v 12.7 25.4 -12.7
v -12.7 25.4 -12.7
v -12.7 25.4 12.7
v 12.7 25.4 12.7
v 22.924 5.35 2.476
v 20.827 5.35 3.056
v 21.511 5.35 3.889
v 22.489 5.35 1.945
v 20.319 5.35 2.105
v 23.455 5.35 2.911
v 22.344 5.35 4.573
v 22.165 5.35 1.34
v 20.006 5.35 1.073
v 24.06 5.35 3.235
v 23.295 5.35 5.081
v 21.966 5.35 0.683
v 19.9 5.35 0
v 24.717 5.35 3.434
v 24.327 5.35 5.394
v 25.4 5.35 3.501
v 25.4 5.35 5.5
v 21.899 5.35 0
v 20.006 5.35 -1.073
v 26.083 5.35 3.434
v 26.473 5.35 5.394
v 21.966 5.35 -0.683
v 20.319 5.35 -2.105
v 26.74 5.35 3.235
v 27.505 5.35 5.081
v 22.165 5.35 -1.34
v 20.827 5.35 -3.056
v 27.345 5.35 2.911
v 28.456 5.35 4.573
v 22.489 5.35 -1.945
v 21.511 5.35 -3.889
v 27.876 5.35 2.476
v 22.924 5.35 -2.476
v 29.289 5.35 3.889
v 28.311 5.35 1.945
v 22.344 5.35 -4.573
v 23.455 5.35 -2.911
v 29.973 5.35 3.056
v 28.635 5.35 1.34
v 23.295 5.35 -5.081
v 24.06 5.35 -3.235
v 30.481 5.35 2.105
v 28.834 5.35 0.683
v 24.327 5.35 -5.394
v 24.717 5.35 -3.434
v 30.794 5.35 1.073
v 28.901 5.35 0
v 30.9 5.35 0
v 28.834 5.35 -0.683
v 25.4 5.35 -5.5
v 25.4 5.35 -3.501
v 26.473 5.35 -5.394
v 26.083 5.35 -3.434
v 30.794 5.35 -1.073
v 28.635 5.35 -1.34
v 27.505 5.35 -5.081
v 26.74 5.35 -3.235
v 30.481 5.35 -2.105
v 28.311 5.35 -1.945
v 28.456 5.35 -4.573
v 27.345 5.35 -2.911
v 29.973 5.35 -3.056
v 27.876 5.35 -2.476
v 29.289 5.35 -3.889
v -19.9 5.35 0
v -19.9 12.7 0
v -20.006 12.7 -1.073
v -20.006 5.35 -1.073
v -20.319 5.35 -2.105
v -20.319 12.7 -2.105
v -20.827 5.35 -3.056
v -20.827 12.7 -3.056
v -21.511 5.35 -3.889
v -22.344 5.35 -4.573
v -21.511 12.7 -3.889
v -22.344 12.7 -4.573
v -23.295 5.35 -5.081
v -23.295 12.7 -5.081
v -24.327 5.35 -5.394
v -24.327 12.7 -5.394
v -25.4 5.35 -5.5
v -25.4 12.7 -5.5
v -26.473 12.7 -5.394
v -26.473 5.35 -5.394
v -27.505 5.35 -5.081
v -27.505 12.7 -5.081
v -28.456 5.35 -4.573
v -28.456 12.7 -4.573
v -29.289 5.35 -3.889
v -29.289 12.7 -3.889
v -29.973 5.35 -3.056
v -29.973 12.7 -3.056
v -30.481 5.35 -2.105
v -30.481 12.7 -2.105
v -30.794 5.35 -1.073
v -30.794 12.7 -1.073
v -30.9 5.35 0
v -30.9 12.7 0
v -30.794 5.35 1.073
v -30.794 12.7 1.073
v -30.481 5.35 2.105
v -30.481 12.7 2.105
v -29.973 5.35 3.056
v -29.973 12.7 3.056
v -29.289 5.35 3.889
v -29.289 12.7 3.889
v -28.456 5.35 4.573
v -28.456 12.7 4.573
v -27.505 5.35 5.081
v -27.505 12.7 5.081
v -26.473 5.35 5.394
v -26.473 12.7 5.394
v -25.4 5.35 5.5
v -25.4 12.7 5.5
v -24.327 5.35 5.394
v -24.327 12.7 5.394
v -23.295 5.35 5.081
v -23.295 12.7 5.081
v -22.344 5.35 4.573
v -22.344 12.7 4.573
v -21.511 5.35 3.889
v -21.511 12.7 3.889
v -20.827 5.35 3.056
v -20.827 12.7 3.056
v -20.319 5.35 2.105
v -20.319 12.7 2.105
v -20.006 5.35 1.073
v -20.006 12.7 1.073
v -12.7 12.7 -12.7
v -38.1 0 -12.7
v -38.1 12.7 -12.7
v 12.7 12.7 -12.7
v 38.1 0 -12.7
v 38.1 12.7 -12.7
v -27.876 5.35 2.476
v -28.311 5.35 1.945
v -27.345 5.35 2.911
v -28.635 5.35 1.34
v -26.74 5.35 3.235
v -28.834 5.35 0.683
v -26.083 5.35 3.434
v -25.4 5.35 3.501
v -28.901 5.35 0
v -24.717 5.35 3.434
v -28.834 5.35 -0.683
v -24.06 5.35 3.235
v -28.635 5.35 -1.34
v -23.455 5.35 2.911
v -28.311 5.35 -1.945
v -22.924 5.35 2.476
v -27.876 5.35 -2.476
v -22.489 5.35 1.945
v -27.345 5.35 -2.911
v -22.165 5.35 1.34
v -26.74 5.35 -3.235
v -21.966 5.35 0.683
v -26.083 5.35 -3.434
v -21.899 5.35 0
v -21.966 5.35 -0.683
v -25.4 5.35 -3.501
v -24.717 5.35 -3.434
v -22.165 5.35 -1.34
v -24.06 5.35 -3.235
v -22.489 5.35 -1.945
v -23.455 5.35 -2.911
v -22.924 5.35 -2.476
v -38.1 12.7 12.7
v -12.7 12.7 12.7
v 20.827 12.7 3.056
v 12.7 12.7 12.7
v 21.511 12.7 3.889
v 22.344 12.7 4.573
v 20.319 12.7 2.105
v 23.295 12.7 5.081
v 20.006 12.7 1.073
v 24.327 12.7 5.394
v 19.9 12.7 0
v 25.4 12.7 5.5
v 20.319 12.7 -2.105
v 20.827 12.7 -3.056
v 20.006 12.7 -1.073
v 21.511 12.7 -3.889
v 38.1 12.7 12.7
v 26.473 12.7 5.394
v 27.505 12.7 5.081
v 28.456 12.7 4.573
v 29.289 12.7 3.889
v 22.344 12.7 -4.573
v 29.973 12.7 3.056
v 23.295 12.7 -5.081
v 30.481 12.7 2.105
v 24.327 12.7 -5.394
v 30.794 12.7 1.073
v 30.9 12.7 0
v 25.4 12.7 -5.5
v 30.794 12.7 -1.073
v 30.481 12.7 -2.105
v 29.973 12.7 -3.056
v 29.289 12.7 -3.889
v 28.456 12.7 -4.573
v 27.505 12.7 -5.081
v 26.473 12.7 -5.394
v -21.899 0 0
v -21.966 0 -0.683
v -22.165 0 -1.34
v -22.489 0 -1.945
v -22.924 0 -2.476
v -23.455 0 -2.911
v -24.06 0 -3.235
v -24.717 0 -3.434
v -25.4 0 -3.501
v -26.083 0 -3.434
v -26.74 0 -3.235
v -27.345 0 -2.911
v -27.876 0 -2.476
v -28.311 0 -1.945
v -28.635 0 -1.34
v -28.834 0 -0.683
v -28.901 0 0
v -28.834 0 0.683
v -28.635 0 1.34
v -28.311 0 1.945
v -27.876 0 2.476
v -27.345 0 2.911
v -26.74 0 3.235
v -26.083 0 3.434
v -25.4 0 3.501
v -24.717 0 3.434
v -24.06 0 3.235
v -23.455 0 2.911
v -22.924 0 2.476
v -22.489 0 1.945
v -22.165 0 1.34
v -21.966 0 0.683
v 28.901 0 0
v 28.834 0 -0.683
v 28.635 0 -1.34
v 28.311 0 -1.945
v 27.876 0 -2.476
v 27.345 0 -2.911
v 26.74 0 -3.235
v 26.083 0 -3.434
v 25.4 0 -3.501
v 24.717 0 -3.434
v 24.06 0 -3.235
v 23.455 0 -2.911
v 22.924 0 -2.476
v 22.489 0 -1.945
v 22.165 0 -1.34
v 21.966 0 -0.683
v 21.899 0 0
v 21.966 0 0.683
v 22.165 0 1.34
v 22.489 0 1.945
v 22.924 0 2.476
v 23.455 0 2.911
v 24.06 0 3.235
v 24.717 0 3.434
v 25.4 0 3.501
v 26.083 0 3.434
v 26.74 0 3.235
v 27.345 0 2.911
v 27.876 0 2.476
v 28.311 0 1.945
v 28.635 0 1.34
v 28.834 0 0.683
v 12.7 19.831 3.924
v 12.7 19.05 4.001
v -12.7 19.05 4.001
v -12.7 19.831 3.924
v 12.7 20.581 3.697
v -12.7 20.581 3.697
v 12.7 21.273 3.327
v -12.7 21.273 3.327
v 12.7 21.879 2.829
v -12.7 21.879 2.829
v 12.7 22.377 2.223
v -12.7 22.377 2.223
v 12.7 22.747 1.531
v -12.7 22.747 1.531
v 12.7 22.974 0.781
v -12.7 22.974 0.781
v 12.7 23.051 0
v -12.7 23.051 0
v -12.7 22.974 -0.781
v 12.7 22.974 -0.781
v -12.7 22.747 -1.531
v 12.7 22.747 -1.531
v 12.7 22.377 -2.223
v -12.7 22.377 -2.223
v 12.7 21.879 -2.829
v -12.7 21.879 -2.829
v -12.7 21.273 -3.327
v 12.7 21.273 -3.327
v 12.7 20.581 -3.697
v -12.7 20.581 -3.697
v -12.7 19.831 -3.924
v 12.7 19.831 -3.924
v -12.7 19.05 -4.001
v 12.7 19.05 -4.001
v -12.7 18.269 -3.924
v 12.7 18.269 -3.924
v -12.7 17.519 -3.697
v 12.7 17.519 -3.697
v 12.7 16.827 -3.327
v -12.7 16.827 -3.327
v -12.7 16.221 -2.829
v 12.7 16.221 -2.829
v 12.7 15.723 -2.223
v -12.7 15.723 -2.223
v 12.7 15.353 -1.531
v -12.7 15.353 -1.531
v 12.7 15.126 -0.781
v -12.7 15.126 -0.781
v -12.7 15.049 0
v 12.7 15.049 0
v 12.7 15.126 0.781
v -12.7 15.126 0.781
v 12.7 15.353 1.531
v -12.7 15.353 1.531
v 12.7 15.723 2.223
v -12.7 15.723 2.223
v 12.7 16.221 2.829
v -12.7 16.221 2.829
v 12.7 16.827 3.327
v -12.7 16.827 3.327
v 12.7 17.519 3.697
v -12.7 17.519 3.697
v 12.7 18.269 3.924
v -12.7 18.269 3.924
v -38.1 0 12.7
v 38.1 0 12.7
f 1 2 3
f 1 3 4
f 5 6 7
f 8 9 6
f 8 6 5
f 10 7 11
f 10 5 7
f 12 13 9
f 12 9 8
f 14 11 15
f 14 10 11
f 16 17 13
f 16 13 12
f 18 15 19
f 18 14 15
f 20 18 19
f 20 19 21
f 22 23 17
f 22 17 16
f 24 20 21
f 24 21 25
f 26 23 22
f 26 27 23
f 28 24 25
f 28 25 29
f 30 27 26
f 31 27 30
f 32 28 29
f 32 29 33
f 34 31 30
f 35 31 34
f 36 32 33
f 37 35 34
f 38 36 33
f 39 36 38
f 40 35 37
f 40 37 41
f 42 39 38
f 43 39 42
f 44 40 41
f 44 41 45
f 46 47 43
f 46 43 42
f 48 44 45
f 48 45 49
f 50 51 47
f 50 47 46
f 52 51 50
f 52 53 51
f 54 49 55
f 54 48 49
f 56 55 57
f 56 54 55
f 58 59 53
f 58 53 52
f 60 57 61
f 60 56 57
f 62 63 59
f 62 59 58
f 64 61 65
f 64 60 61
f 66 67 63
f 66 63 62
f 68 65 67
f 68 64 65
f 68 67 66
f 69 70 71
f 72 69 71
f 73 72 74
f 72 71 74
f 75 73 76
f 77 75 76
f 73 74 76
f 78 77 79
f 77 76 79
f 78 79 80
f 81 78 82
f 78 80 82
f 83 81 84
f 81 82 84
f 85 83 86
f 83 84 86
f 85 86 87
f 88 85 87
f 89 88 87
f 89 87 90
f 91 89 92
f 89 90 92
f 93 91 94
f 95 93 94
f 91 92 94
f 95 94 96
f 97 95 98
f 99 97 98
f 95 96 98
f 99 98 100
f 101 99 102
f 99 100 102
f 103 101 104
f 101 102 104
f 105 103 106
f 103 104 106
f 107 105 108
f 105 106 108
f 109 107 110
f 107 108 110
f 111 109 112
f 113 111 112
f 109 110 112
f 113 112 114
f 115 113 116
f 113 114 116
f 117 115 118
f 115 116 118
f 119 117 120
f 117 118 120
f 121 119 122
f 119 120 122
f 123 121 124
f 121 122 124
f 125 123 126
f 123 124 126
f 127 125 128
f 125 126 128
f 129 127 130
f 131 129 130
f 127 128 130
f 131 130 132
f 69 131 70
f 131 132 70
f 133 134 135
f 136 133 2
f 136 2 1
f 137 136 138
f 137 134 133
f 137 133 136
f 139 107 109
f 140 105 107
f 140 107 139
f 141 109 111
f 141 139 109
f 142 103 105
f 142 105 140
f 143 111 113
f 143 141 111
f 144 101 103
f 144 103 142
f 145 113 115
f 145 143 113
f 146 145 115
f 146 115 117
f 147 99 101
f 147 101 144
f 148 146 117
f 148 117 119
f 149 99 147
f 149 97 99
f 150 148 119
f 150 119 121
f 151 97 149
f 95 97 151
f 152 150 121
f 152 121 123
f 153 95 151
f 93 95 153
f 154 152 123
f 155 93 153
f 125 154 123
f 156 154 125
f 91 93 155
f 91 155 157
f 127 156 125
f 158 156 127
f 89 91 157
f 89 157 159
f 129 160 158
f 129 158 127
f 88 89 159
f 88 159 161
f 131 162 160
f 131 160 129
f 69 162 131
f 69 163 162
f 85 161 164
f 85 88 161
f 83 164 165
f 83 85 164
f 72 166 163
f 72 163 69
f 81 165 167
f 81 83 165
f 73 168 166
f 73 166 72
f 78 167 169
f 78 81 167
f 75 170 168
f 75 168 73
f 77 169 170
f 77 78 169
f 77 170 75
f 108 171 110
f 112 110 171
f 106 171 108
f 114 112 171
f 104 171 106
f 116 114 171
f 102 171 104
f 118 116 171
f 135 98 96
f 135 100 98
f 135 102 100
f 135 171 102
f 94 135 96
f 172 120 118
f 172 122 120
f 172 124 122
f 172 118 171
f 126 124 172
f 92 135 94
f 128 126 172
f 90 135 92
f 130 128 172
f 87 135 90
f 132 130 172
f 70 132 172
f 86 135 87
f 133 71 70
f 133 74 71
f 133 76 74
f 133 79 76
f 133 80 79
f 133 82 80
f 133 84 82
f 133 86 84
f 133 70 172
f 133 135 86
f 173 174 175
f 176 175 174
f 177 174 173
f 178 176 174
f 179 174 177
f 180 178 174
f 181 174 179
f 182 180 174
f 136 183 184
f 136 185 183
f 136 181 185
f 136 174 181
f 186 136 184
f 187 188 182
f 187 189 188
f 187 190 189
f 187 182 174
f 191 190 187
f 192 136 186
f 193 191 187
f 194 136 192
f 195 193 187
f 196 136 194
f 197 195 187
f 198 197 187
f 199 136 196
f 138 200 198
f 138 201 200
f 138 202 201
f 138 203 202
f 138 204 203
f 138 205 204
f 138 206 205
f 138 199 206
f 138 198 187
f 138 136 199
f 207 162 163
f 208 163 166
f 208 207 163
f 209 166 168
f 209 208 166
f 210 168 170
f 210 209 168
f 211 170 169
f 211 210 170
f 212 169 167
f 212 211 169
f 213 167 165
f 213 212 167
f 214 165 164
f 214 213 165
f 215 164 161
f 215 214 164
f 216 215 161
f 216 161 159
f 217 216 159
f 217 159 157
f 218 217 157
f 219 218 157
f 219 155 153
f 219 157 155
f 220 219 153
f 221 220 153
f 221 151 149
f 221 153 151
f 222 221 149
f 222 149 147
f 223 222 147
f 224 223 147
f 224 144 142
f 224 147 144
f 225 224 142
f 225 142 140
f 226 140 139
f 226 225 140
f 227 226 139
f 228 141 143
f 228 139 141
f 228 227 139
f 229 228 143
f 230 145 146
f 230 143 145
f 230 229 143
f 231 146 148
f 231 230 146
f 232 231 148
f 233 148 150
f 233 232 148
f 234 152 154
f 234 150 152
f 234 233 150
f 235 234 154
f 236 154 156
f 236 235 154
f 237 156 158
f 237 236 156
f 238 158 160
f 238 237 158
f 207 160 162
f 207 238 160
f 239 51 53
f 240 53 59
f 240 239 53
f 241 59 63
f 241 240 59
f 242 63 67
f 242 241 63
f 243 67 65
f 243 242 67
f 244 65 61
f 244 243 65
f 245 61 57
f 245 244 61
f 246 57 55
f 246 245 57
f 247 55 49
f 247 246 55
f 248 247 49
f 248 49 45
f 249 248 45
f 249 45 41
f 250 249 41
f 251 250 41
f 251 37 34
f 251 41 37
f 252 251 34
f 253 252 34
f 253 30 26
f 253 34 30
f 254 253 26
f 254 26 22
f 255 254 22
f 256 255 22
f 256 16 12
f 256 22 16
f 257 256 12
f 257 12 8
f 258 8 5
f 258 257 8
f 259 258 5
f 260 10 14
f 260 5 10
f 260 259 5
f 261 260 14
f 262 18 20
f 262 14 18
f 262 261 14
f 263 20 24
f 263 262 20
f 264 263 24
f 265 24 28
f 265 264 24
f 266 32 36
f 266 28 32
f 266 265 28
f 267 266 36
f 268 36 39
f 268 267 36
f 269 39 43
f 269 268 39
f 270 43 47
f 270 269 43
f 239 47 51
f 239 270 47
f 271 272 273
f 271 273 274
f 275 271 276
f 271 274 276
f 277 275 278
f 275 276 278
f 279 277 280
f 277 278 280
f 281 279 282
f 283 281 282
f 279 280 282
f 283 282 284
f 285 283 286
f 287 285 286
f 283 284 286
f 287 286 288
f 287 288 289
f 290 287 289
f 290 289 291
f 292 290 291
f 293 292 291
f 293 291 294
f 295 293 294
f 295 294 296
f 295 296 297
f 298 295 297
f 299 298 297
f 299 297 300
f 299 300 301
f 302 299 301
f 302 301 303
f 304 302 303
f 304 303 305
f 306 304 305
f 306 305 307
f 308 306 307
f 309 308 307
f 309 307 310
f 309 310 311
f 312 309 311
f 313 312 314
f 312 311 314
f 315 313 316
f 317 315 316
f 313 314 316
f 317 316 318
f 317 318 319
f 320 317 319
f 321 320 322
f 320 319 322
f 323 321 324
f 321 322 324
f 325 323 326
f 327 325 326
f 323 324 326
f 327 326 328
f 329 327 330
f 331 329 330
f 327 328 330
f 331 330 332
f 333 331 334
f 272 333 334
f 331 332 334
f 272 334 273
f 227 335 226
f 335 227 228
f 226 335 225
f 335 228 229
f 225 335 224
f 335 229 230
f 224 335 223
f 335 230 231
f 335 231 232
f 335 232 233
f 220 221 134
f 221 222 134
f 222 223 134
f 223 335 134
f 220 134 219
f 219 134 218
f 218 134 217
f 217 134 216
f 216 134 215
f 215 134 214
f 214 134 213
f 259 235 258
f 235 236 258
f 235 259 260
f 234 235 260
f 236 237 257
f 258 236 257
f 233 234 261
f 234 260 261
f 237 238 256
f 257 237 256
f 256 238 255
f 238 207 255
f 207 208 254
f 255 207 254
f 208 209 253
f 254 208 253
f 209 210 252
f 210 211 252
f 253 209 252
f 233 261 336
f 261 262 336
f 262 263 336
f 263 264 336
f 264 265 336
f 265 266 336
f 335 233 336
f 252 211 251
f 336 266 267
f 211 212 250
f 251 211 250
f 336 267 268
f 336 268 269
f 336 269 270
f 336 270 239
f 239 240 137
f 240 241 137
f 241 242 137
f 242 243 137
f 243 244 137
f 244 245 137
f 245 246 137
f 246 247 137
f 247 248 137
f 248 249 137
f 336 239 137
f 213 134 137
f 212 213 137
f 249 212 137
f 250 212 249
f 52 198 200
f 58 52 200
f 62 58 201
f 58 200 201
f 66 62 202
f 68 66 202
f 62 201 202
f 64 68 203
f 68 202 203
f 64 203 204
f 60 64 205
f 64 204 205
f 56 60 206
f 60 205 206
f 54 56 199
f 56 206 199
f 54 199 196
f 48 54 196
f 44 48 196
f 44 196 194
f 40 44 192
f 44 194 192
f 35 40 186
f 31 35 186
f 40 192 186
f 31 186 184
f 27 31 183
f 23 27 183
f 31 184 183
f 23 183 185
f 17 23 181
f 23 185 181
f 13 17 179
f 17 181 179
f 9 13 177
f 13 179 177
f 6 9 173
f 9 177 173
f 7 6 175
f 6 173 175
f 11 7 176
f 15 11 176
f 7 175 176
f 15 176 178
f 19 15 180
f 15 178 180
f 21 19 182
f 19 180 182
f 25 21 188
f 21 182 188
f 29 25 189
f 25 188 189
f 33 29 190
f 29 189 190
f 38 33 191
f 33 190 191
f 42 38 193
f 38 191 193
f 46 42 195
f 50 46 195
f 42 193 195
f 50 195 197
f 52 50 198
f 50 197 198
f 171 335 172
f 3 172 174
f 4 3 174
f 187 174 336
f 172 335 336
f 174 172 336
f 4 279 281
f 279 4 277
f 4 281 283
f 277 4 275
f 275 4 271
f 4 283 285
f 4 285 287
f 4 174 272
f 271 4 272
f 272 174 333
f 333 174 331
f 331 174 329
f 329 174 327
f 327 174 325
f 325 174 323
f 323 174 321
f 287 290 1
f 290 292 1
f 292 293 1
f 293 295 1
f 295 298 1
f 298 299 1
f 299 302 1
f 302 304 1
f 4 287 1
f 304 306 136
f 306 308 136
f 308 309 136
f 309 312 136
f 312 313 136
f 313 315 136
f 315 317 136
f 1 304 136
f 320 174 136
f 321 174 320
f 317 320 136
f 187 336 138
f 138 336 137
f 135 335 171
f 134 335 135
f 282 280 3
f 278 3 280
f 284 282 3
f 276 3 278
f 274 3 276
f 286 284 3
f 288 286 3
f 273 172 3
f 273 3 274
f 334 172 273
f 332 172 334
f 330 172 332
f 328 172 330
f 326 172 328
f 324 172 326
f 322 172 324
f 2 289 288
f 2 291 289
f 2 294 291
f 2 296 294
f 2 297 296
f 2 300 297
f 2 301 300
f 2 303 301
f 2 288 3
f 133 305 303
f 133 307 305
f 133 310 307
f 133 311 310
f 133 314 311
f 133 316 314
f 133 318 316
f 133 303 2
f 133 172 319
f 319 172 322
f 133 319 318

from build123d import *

# Parameters (mm, degrees)
SKETCH1_W           = 76.2
SKETCH1_H           = 25.4
SKETCH1_R           = 3.501199875
BOSS_EXTRUDE1_DEPTH = 12.7
SKETCH2_W           = 25.4
SKETCH2_H           = 25.4
BOSS_EXTRUDE2_DEPTH = 12.7
SKETCH3_R           = 4.001199875
CUT_EXTRUDE1_DEPTH  = 43.7
SKETCH4_R           = 5.5
CUT_EXTRUDE2_DEPTH  = 7.35


with BuildPart() as part:
    # Sketch1 → Boss-Extrude1 (new body)
    with BuildSketch(Plane(origin=(0, 0, 0), x_dir=(1, 0, 0), z_dir=(0, 1, 0))):
        Rectangle(SKETCH1_W, SKETCH1_H)
        with Locations((-25.4, 0)):
            Circle(SKETCH1_R, mode=Mode.SUBTRACT)
        with Locations((25.4, 0)):
            Circle(SKETCH1_R, mode=Mode.SUBTRACT)
    extrude(amount=BOSS_EXTRUDE1_DEPTH)

    # Sketch2 → Boss-Extrude2 (add)
    with BuildSketch(Plane(origin=(0, 12.7, 0), x_dir=(1, 0, 0), z_dir=(0, 1, 0))):
        Rectangle(SKETCH2_W, SKETCH2_H)
    extrude(amount=BOSS_EXTRUDE2_DEPTH)

    # Sketch3 → Cut-Extrude1 (cut)
    with BuildSketch(Plane.ZY.offset(12.7)):
        with Locations((0, 19.05)):
            Circle(SKETCH3_R)
    extrude(amount=-CUT_EXTRUDE1_DEPTH, mode=Mode.SUBTRACT)

    # Sketch4 → Cut-Extrude2 (cut)
    with BuildSketch(Plane(origin=(0, 12.7, 0), x_dir=(1, 0, 0), z_dir=(0, 1, 0))):
        with Locations((-25.4, 0)):
            Circle(SKETCH4_R)
        with Locations((25.4, 0)):
            Circle(SKETCH4_R)
    extrude(amount=-CUT_EXTRUDE2_DEPTH, mode=Mode.SUBTRACT)


solid = part.part
